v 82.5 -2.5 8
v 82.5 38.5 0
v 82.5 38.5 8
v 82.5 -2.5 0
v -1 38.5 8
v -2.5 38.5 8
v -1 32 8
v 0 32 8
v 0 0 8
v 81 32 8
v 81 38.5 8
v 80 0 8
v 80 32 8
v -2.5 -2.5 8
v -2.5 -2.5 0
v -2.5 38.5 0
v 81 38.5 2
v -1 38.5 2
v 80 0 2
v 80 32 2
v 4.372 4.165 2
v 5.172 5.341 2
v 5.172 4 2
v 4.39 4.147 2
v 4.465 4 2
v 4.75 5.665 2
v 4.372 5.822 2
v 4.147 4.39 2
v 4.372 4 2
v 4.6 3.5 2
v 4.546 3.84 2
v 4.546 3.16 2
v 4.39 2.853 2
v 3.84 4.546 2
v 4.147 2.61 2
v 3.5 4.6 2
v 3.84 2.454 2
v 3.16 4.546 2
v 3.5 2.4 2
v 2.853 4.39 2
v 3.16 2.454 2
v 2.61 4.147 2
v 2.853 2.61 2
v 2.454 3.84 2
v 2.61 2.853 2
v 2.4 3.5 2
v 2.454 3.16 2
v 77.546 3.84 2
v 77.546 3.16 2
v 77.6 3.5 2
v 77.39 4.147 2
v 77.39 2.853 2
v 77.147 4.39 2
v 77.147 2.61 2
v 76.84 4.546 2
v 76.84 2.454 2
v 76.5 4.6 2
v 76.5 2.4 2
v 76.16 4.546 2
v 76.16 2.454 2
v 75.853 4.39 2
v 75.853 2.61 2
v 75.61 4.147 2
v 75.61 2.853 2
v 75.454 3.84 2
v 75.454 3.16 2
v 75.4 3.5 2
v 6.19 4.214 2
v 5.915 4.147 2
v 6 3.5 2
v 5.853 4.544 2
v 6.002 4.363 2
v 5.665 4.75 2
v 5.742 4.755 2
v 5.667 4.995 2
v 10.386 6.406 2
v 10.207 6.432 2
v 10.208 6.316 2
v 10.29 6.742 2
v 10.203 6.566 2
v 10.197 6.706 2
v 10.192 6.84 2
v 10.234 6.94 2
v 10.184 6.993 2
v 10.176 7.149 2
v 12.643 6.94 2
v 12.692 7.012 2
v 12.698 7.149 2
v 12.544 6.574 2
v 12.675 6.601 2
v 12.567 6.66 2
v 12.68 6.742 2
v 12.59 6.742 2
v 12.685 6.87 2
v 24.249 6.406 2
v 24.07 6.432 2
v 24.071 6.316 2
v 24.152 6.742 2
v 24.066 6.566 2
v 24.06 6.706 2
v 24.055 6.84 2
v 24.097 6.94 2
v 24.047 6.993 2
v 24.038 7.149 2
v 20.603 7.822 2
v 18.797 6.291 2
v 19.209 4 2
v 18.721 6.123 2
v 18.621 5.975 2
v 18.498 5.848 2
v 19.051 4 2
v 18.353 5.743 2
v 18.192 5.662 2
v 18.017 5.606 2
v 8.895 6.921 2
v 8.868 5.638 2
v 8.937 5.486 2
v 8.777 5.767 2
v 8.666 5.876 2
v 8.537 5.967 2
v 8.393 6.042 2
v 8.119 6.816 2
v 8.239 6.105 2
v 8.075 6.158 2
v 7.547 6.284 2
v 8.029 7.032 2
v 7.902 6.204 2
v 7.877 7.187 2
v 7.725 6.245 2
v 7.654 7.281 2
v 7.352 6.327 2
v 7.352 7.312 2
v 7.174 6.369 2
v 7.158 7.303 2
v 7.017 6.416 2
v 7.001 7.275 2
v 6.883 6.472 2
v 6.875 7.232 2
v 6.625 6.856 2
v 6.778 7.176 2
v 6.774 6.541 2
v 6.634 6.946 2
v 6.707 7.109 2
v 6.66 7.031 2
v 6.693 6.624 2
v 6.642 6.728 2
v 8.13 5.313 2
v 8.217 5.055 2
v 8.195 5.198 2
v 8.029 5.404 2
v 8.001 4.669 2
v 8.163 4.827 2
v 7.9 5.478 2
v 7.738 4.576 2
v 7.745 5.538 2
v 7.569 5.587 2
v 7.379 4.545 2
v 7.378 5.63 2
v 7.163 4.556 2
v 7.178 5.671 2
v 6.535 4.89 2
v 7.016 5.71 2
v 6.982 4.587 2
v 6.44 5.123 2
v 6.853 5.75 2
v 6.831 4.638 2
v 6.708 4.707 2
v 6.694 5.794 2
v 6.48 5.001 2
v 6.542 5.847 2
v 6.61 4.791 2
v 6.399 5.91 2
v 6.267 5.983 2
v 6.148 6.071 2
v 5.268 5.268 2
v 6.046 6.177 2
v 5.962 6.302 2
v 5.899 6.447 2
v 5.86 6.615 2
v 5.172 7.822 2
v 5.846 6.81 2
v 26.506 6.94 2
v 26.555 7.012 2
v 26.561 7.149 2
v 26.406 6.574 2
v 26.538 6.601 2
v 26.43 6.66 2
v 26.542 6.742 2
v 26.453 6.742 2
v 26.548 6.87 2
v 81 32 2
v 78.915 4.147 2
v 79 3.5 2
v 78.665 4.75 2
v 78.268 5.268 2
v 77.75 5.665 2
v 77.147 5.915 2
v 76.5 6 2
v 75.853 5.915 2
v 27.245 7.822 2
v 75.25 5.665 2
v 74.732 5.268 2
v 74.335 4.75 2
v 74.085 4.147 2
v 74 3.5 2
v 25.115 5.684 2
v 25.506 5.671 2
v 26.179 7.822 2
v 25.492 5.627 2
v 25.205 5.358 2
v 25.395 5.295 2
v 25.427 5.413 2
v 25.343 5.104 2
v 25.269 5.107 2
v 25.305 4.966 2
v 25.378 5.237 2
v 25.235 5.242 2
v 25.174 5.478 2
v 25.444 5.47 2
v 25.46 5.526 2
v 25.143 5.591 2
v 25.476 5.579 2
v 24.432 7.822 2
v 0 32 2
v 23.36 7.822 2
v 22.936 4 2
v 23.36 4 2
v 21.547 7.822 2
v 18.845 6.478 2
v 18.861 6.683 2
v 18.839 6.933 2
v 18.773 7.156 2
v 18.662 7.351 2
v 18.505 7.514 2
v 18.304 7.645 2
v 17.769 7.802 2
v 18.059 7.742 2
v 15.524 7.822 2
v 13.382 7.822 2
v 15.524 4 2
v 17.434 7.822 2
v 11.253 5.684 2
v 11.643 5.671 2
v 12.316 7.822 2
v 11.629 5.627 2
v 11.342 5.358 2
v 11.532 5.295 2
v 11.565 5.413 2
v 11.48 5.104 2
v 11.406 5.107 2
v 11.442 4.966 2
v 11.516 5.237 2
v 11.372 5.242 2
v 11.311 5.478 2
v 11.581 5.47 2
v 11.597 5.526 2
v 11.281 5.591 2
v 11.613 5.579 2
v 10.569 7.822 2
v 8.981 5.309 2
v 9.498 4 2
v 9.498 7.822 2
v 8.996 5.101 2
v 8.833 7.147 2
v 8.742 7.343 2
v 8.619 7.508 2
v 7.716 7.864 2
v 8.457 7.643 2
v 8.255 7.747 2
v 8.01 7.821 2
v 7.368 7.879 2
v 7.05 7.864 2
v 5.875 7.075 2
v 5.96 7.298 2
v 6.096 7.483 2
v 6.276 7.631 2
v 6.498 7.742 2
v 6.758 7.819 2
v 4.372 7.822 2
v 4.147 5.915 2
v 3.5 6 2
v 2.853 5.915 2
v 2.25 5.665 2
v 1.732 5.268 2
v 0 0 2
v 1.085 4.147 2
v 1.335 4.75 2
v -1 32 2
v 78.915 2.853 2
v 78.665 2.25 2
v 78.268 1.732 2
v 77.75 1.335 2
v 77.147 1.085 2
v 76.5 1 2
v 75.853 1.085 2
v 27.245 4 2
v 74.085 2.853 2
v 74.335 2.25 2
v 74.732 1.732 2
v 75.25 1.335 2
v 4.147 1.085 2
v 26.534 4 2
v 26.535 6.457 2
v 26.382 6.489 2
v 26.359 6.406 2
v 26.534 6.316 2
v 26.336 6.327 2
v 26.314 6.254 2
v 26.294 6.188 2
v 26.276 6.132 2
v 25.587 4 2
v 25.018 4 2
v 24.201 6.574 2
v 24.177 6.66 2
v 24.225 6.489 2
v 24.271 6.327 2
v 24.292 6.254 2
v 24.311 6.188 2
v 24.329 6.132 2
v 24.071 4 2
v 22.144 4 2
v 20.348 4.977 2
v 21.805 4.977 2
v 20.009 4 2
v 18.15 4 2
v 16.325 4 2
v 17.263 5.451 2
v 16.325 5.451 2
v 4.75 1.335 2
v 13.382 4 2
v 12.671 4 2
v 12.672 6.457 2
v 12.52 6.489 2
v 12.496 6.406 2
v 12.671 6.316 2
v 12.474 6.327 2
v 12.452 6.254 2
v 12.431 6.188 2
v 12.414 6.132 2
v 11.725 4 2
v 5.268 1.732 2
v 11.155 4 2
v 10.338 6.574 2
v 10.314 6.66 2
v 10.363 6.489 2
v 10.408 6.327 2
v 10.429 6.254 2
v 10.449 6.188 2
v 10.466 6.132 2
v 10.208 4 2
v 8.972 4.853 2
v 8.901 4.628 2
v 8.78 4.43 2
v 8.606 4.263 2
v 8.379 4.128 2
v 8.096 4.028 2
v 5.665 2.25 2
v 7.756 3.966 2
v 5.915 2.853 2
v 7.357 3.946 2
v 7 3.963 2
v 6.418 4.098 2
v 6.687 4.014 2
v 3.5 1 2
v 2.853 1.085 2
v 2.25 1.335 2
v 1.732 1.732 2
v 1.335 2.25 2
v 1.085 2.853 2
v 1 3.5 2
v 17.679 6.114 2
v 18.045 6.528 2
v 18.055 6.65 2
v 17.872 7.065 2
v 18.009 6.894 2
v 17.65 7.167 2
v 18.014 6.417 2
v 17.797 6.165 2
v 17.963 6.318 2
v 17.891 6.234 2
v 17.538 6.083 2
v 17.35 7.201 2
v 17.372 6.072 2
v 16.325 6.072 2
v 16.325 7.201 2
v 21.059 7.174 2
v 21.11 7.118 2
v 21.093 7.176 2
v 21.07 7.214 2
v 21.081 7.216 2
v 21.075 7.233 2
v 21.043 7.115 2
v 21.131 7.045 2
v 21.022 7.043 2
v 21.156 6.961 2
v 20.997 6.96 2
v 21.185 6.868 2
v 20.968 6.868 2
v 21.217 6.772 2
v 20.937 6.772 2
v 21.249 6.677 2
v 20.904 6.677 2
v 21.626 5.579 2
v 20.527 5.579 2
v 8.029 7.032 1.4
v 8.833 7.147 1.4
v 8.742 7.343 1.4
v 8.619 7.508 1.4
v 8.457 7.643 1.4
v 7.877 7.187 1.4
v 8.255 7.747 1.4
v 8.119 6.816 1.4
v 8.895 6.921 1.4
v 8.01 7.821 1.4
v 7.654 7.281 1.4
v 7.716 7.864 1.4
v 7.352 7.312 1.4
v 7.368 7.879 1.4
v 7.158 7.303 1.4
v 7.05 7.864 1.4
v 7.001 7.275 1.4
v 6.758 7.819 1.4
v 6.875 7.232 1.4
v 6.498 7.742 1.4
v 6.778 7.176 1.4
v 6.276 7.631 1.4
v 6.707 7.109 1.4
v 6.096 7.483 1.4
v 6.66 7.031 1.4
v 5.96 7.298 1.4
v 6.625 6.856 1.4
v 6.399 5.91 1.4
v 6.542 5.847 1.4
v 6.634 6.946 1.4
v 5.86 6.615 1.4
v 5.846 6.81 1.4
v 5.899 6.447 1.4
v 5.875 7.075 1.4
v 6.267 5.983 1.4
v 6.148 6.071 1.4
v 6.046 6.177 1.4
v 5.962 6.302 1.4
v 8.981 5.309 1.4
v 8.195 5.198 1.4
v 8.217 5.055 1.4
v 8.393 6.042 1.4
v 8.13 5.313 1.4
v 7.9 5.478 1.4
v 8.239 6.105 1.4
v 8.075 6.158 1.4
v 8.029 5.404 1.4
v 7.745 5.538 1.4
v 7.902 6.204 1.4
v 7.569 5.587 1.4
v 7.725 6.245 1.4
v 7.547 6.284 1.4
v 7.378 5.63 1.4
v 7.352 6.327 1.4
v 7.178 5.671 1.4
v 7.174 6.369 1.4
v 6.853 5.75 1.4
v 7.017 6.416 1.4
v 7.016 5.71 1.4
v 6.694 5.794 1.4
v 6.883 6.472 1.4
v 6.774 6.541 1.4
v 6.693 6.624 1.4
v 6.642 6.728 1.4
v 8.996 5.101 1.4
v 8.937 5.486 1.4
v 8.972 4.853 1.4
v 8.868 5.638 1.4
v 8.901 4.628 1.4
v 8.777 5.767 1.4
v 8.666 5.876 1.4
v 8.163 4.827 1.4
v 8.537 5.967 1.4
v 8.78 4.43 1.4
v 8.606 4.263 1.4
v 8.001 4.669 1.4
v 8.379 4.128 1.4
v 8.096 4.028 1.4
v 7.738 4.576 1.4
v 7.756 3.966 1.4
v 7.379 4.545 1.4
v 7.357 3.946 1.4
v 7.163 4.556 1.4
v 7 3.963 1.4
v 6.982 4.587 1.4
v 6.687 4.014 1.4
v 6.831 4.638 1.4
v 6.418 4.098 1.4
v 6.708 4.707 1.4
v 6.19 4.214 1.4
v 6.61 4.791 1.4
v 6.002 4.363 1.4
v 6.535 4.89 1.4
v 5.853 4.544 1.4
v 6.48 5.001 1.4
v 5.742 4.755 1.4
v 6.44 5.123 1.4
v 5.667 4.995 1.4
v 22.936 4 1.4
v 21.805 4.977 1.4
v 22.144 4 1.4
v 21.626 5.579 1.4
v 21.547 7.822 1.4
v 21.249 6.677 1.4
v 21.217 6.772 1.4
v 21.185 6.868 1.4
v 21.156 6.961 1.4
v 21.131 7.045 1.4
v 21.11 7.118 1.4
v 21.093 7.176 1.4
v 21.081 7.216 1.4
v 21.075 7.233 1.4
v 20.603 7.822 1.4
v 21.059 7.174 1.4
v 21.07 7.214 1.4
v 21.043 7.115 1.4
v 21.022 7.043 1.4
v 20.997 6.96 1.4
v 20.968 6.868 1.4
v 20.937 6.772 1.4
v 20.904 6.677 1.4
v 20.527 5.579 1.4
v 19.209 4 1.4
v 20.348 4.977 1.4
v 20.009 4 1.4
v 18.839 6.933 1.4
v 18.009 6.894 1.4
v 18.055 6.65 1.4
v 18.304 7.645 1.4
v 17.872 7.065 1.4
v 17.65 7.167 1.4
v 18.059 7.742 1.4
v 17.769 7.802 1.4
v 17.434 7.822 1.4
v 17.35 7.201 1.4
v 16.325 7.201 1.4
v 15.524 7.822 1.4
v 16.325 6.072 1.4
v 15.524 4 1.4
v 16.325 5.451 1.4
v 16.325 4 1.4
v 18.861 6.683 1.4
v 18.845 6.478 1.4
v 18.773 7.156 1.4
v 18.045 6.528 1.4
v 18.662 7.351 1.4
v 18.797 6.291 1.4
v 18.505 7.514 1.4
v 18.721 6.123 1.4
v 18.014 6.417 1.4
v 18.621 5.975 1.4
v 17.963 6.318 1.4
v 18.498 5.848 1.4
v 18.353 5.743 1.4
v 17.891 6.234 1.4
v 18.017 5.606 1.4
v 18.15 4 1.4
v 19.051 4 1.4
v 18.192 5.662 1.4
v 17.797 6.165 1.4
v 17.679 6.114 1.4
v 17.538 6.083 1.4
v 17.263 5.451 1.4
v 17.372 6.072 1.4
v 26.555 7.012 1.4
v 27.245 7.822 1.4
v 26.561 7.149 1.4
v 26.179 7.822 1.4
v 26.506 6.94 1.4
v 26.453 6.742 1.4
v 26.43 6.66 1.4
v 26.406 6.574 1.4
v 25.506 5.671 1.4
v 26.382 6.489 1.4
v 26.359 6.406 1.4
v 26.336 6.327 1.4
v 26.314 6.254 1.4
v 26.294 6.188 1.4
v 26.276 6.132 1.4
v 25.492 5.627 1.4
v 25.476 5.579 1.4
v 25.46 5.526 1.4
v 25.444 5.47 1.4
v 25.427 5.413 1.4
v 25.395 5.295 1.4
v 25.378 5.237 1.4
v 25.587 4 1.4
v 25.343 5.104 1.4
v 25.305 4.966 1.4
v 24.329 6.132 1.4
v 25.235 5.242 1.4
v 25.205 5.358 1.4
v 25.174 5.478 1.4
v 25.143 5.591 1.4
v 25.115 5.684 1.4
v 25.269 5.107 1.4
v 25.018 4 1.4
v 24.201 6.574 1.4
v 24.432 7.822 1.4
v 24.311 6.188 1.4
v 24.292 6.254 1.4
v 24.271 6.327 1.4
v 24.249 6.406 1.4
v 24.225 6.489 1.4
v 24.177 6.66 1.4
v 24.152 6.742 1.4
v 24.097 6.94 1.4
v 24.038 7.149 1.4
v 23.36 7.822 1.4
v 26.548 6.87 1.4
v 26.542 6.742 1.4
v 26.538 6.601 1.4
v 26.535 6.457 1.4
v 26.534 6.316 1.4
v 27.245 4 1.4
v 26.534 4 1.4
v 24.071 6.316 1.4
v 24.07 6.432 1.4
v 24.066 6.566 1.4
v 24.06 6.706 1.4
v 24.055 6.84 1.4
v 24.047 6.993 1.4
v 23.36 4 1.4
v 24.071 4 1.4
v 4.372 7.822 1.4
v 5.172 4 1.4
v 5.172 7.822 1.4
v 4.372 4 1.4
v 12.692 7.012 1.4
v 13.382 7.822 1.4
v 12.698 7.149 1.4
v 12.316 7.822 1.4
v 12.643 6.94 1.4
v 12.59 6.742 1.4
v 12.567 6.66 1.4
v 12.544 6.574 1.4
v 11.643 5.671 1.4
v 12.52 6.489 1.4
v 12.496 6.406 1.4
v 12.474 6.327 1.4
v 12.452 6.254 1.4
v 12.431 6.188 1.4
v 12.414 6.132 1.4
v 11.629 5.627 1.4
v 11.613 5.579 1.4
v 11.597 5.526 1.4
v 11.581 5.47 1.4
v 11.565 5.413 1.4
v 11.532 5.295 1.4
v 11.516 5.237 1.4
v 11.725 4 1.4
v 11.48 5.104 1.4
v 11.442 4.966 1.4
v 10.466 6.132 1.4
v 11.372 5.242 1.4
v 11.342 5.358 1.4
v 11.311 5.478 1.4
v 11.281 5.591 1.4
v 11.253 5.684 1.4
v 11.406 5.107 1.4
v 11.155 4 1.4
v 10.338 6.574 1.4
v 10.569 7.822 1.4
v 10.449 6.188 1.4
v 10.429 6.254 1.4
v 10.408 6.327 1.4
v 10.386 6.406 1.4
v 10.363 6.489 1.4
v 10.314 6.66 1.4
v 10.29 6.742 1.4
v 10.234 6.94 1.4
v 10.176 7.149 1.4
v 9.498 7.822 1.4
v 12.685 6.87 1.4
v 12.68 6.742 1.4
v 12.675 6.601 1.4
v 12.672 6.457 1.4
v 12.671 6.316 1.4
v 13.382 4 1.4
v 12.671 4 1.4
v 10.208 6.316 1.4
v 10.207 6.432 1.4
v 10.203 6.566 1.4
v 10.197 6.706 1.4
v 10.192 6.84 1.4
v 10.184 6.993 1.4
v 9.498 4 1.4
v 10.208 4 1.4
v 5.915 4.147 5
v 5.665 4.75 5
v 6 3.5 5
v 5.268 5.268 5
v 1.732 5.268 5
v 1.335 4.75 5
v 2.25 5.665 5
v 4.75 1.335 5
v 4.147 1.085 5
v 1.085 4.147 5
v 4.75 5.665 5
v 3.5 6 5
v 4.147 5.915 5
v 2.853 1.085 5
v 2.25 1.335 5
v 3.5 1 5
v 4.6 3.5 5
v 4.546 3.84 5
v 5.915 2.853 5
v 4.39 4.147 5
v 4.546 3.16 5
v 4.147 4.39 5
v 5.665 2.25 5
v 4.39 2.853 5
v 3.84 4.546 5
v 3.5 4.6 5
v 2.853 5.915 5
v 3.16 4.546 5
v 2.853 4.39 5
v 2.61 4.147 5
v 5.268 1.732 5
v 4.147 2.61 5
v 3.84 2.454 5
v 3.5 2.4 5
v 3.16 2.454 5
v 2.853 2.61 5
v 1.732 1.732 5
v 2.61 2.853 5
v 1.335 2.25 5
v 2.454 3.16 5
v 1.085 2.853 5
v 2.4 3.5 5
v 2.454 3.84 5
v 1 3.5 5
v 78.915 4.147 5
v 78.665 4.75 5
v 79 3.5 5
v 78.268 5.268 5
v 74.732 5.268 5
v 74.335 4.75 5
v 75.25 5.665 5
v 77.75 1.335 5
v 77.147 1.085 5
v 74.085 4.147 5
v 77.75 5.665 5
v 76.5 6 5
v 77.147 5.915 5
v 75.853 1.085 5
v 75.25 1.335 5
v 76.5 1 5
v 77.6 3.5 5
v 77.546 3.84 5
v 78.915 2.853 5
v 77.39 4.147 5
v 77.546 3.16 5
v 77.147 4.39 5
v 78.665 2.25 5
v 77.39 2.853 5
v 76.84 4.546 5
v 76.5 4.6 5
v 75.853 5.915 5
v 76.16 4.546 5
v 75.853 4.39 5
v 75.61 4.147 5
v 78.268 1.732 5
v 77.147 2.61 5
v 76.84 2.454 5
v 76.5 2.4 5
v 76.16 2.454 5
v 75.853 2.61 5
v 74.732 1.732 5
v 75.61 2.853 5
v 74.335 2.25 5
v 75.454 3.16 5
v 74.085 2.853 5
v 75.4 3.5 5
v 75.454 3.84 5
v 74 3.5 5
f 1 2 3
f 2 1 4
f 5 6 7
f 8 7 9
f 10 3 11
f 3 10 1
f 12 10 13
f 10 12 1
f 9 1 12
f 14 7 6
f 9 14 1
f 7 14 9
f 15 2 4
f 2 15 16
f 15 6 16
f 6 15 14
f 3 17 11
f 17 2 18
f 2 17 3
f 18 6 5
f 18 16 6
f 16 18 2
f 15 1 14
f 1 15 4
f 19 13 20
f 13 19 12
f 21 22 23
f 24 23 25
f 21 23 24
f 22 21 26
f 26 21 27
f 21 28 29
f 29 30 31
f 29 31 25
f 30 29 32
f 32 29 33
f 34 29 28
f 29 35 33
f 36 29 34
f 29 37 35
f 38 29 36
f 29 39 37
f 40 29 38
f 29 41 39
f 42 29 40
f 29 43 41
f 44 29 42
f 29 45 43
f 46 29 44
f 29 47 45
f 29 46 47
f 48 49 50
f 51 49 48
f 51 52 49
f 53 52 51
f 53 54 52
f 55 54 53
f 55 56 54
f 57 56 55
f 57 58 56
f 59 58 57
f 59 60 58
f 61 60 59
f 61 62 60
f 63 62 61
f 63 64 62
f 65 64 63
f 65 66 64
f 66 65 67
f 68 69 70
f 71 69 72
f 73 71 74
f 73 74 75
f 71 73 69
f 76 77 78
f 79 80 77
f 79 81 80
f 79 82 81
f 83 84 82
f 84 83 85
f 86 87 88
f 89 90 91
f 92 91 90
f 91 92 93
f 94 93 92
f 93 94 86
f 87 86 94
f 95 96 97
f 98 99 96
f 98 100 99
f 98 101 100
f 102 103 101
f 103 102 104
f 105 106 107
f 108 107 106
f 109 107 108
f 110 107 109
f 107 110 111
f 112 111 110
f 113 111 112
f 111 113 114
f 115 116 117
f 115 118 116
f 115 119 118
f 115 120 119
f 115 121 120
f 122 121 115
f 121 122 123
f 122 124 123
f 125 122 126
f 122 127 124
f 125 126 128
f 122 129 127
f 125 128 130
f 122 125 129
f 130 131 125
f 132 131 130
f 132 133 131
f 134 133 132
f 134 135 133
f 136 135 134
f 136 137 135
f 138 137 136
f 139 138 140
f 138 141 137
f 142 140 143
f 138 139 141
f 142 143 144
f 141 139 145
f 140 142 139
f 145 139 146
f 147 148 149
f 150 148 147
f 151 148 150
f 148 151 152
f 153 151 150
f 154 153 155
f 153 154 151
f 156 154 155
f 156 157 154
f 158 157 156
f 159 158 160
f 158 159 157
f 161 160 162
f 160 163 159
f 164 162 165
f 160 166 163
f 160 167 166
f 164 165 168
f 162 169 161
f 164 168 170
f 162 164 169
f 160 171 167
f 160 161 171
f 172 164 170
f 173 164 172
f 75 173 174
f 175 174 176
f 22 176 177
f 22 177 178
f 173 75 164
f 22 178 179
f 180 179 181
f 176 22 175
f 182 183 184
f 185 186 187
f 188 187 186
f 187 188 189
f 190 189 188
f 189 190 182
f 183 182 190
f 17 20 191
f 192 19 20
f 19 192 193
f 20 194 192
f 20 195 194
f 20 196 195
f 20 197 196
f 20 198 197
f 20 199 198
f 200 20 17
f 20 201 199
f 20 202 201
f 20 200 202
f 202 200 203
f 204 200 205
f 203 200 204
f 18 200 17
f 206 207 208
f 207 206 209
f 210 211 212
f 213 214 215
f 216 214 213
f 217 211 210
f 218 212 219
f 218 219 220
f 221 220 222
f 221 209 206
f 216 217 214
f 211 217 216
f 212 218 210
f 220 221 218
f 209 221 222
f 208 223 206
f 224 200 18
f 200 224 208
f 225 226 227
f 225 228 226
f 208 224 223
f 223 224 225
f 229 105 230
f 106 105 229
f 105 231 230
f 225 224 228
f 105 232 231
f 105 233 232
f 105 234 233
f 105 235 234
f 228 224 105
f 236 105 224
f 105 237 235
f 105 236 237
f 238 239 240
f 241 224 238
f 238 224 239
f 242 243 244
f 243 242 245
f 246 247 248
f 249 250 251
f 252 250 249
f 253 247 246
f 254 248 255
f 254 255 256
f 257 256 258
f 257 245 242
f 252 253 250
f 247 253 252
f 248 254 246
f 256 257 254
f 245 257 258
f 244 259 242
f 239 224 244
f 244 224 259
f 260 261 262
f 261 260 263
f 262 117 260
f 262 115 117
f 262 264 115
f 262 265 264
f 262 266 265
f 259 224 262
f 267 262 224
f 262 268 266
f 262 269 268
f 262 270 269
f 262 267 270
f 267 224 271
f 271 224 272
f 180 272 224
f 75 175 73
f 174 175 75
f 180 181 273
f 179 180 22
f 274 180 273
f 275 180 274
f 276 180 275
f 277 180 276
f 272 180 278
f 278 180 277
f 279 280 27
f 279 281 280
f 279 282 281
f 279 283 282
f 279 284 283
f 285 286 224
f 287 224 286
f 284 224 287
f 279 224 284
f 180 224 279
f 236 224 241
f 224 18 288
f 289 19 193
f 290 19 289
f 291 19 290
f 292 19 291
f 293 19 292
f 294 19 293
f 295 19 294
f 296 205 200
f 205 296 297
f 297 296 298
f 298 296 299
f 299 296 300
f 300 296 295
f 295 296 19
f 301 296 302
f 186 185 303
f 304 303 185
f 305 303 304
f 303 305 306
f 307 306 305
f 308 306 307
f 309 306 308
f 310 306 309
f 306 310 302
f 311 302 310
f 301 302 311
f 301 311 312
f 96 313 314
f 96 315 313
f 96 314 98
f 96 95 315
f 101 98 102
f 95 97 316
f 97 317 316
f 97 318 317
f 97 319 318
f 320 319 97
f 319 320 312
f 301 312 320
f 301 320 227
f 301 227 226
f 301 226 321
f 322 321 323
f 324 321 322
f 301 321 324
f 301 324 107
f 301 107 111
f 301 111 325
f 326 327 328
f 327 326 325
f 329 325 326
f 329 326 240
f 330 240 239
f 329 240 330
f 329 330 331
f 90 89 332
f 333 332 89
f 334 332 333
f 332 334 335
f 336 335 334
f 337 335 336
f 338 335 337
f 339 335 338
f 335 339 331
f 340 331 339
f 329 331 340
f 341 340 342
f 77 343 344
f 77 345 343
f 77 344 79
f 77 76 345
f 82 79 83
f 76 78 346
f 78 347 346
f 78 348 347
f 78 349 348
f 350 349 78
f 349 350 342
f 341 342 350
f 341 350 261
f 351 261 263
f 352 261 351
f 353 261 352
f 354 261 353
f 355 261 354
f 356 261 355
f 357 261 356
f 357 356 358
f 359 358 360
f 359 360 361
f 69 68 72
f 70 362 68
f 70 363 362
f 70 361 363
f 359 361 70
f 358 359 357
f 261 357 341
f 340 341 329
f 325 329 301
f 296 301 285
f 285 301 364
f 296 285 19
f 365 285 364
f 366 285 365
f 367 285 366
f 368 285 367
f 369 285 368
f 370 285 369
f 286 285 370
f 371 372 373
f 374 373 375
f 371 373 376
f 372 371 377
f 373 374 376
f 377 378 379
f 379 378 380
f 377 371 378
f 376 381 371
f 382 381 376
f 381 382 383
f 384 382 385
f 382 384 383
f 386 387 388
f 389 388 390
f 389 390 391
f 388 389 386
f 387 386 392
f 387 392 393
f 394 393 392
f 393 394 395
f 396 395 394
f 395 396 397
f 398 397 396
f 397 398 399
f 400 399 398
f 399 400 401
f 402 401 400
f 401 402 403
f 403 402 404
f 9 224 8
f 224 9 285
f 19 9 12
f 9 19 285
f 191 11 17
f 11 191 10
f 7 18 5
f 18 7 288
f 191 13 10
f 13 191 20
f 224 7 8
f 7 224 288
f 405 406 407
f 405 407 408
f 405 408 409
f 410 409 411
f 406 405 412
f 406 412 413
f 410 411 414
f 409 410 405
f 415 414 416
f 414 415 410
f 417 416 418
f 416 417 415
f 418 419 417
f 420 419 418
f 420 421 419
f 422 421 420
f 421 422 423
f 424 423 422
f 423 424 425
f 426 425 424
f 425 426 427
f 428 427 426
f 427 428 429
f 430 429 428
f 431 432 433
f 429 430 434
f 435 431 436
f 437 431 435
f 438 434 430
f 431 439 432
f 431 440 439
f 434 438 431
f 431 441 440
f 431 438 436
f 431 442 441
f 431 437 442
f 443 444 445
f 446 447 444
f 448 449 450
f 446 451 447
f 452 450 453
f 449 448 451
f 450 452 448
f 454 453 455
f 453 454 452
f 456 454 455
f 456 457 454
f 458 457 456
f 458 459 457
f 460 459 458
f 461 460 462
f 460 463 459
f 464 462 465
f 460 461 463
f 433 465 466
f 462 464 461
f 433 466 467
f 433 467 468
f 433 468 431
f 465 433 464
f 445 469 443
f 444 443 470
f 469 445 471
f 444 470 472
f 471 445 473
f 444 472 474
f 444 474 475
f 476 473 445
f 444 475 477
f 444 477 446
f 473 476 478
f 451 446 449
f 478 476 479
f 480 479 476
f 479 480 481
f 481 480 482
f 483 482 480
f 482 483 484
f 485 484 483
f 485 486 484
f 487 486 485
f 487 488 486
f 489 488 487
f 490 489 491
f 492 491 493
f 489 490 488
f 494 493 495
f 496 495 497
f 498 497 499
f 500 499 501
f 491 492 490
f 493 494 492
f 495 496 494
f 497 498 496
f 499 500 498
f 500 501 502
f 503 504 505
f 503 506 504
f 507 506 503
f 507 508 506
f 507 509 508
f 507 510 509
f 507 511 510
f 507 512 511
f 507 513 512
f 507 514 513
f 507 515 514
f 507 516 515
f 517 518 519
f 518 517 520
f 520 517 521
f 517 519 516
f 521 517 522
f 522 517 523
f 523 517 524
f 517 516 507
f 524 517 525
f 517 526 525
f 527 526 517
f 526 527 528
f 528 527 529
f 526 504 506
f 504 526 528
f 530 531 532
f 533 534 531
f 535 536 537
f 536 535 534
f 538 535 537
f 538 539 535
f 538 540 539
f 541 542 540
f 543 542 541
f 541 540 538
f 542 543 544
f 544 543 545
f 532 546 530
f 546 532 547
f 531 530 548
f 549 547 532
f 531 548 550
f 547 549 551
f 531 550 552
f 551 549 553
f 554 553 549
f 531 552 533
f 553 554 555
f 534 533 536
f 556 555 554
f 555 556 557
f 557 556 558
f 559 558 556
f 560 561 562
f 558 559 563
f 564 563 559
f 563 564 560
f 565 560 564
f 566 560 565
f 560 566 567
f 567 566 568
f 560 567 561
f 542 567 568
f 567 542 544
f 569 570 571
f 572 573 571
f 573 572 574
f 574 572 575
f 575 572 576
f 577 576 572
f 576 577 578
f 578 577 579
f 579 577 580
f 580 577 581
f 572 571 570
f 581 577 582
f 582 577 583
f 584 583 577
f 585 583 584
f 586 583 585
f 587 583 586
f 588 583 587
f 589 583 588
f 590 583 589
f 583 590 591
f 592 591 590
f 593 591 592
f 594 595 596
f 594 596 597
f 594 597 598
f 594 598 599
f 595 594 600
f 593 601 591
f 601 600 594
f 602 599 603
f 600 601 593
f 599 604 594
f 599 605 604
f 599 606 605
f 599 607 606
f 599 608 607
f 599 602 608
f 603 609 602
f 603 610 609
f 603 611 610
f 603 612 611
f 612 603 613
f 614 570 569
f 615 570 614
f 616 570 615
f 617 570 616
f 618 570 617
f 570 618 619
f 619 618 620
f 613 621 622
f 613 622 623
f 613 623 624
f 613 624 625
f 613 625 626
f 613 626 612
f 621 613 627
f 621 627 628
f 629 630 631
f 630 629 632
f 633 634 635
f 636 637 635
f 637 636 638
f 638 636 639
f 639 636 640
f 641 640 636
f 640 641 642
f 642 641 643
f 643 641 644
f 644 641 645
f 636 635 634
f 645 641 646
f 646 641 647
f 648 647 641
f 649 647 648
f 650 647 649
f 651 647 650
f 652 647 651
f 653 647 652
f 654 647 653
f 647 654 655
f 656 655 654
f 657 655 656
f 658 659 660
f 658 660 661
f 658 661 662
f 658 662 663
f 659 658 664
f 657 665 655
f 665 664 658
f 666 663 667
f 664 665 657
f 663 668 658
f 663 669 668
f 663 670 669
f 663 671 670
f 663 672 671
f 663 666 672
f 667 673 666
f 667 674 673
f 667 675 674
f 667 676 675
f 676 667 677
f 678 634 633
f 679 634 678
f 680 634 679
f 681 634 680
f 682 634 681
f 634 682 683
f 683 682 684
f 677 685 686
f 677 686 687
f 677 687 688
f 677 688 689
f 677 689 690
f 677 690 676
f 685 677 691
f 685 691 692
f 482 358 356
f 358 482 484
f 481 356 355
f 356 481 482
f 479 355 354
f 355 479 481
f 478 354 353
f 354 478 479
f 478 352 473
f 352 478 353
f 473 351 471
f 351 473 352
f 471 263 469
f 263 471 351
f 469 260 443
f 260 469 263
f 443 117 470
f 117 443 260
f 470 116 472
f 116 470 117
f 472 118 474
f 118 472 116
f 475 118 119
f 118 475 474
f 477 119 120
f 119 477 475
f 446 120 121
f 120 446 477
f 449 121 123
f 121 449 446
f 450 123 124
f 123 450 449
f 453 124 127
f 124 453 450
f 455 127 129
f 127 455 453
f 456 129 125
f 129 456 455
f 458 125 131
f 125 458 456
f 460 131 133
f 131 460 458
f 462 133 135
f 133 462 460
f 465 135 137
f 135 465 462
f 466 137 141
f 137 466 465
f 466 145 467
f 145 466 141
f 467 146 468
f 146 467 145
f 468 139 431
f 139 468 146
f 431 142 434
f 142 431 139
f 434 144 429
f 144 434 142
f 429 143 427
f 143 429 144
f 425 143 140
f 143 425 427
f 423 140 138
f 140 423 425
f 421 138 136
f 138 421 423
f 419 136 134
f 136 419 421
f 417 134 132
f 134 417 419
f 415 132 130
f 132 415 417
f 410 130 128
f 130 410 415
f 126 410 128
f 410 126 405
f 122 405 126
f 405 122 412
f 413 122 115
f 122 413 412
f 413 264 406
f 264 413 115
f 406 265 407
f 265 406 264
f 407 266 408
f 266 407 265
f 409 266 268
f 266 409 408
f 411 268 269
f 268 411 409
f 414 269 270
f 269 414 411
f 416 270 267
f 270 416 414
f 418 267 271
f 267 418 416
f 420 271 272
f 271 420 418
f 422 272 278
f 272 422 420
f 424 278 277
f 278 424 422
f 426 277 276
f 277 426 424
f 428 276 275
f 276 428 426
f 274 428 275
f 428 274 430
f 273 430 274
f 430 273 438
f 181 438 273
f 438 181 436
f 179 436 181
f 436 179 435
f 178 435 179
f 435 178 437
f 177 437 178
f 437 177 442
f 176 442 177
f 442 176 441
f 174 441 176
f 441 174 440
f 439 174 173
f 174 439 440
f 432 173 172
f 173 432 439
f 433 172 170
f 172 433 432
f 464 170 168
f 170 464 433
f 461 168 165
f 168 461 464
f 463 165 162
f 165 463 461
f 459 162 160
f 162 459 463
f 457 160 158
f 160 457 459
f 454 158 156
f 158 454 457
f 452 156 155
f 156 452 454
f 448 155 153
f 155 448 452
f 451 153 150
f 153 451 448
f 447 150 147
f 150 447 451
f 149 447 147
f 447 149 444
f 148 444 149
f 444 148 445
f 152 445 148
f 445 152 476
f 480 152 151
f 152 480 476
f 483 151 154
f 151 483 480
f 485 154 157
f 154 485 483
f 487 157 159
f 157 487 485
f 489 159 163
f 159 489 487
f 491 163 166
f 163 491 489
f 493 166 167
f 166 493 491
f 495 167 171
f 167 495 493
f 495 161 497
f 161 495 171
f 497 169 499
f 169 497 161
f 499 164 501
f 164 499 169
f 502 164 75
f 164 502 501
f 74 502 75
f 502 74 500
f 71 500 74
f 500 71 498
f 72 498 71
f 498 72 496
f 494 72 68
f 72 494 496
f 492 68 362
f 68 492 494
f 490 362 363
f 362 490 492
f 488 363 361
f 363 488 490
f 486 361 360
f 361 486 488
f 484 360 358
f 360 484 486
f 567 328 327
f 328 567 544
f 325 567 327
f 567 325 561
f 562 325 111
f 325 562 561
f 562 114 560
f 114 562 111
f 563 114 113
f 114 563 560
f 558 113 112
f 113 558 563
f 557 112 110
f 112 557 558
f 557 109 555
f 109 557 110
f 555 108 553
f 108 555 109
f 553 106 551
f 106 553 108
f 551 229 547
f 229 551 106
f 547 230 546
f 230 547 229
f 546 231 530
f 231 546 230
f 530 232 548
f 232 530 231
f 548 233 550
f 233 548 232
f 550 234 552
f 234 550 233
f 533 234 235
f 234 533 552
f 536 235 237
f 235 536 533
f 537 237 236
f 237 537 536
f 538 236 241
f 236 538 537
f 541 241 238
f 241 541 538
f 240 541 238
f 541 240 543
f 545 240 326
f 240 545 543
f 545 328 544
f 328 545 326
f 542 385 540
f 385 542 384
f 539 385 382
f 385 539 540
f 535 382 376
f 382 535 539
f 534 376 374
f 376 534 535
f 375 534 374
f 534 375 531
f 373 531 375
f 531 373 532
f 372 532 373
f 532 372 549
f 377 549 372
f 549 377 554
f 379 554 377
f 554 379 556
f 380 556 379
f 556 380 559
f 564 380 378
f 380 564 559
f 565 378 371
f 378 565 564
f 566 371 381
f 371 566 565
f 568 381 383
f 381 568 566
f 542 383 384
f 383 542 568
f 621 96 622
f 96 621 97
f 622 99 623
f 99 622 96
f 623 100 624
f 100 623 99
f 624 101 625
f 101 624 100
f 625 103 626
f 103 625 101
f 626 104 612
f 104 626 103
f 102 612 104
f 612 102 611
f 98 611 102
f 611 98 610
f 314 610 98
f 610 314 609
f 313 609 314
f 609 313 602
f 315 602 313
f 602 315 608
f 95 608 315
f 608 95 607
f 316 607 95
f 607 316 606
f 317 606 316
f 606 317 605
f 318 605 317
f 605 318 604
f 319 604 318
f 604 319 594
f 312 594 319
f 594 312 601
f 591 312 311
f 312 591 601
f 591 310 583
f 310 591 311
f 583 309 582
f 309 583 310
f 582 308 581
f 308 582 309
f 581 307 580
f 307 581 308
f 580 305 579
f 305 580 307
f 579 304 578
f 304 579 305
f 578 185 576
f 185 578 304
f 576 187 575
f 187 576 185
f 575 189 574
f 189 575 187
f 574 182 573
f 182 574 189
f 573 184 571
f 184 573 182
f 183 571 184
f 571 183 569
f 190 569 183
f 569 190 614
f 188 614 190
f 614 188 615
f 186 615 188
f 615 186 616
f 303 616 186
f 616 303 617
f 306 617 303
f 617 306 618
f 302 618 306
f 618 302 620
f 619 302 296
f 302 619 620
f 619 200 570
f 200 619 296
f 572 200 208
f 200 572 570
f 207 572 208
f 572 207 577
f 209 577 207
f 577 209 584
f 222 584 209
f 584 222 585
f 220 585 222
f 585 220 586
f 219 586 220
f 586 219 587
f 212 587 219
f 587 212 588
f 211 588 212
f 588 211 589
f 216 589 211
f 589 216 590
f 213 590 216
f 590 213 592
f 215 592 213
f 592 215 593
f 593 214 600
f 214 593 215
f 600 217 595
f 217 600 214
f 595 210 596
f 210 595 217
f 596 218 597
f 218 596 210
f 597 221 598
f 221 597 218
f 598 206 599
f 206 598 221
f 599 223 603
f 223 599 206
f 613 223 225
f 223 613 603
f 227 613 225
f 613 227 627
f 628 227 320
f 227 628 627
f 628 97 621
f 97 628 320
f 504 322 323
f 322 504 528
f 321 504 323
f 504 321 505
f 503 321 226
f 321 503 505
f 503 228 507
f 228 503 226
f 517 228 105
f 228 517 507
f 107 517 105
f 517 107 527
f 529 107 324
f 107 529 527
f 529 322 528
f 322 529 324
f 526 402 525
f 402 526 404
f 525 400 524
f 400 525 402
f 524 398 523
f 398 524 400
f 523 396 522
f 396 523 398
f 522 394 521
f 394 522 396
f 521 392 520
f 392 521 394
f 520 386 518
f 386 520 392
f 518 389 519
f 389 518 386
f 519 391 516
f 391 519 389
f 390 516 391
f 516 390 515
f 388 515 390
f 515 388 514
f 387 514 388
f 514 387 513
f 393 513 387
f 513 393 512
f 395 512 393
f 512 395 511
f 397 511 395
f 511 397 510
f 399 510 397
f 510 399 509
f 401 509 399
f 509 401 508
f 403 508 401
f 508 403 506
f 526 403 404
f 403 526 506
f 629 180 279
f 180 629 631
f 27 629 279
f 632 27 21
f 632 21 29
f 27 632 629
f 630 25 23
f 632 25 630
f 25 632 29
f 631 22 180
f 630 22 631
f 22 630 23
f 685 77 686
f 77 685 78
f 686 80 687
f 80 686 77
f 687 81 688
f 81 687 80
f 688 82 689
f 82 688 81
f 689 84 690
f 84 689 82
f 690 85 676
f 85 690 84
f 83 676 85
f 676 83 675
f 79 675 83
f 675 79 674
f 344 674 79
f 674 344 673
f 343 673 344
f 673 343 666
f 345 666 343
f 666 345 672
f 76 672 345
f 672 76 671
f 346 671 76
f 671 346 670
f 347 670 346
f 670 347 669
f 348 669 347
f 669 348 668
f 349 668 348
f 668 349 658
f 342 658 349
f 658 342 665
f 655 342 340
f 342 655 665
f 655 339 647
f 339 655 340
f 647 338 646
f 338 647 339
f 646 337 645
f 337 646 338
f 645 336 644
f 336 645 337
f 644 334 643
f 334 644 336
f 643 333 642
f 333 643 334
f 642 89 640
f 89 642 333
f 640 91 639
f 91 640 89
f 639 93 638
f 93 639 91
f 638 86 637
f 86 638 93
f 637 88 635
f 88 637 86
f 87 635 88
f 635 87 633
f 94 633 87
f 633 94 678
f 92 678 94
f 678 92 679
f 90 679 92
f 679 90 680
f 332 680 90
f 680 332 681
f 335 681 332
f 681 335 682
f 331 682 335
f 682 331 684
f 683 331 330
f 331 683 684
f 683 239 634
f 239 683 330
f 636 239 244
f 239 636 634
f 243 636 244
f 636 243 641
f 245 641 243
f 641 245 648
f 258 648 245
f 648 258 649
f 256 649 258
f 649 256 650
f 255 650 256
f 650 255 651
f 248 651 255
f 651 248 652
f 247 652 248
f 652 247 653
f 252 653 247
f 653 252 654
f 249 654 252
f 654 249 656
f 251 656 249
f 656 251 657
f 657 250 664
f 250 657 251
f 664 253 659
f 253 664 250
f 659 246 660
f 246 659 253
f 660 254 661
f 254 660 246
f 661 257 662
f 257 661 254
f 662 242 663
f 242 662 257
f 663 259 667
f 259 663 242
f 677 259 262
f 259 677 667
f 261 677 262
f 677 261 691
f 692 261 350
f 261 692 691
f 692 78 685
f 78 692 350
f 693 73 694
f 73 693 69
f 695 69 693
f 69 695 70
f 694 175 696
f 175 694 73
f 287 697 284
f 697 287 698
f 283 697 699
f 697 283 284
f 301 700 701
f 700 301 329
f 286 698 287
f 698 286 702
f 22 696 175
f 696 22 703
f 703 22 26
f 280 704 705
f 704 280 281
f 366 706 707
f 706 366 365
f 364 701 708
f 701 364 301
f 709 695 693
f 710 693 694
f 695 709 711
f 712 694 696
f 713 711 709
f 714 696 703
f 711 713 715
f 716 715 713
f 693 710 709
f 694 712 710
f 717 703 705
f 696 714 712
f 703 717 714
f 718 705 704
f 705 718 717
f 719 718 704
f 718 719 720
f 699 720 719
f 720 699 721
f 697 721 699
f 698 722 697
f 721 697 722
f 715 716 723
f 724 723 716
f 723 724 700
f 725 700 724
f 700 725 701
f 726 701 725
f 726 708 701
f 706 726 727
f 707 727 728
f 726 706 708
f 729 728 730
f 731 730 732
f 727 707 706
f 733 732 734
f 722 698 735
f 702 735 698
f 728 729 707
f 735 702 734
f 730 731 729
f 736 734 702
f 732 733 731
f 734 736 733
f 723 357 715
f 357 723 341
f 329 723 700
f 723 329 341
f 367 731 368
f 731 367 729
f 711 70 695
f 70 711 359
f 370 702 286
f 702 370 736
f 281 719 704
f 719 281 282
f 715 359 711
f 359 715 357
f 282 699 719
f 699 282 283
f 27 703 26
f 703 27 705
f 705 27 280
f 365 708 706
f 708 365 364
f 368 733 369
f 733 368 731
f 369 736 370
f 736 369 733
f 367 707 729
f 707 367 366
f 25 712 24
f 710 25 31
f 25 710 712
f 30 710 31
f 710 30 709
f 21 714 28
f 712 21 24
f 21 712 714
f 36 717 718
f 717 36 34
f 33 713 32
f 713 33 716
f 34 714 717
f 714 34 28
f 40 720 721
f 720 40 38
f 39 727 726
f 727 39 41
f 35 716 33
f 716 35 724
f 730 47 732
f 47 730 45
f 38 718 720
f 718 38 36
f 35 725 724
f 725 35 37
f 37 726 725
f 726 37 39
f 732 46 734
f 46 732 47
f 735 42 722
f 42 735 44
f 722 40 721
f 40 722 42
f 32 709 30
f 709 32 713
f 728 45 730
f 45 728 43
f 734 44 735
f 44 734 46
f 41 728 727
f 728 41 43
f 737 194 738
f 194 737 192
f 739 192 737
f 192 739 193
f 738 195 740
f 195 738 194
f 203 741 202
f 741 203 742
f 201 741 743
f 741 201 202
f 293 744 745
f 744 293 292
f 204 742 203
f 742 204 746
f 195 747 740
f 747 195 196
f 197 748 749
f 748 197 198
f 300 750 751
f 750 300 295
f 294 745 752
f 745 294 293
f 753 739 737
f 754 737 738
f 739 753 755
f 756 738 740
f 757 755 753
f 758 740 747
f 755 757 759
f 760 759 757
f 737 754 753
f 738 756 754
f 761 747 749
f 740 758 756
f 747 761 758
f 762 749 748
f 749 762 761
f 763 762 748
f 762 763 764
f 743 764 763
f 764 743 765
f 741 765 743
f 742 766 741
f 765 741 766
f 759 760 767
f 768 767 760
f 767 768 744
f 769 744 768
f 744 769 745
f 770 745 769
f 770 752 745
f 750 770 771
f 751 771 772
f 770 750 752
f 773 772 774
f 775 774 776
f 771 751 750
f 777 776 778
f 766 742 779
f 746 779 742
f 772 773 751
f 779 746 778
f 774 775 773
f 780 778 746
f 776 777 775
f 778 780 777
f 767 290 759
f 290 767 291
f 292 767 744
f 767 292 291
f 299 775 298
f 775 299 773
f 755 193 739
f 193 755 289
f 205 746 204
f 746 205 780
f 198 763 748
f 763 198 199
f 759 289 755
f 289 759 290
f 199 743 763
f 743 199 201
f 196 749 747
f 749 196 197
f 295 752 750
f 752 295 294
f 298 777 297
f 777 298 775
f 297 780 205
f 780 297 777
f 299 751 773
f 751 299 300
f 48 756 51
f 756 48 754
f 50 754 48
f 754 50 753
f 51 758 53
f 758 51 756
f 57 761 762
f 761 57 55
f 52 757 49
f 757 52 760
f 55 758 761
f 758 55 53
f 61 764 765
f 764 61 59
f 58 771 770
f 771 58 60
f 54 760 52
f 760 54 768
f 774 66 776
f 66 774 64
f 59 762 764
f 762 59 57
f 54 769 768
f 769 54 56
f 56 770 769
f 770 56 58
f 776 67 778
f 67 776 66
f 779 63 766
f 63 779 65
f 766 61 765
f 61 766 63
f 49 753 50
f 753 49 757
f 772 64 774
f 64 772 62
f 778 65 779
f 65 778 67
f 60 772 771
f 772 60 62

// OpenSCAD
// ISM Memory RAM module carrier tray (original ISM)
pcb_w=80; pcb_h=36; wall=2.5; base_th=2; tray_z=8; lip=1.2; edge_cut=4;
module tray(){difference(){
  translate([-wall,-wall,0])cube([pcb_w+2*wall,pcb_h+2*wall,tray_z]);
  translate([0,0,base_th])cube([pcb_w,pcb_h,tray_z]);
  // edge finger access slot
  translate([-1,pcb_h-edge_cut,base_th])cube([pcb_w+2,edge_cut+wall+1,tray_z]);
  translate([4,4,base_th-0.6])linear_extrude(0.7)text("ISM RAM",size=4,font="Liberation Sans:style=Bold");
}for(p=[[3.5,3.5],[pcb_w-3.5,3.5]])translate([p[0],p[1],base_th])difference(){cylinder(h=3,d=5,$fn=24);translate([0,0,-0.1])cylinder(h=4,d=2.2,$fn=20);}}
module lid(){difference(){
  translate([-wall,-wall,0])cube([pcb_w+2*wall,pcb_h+2*wall-edge_cut,3]);
  translate([lip,lip,-1])cube([pcb_w-2*lip,pcb_h-2*lip-edge_cut,5]);
}}
tray();
